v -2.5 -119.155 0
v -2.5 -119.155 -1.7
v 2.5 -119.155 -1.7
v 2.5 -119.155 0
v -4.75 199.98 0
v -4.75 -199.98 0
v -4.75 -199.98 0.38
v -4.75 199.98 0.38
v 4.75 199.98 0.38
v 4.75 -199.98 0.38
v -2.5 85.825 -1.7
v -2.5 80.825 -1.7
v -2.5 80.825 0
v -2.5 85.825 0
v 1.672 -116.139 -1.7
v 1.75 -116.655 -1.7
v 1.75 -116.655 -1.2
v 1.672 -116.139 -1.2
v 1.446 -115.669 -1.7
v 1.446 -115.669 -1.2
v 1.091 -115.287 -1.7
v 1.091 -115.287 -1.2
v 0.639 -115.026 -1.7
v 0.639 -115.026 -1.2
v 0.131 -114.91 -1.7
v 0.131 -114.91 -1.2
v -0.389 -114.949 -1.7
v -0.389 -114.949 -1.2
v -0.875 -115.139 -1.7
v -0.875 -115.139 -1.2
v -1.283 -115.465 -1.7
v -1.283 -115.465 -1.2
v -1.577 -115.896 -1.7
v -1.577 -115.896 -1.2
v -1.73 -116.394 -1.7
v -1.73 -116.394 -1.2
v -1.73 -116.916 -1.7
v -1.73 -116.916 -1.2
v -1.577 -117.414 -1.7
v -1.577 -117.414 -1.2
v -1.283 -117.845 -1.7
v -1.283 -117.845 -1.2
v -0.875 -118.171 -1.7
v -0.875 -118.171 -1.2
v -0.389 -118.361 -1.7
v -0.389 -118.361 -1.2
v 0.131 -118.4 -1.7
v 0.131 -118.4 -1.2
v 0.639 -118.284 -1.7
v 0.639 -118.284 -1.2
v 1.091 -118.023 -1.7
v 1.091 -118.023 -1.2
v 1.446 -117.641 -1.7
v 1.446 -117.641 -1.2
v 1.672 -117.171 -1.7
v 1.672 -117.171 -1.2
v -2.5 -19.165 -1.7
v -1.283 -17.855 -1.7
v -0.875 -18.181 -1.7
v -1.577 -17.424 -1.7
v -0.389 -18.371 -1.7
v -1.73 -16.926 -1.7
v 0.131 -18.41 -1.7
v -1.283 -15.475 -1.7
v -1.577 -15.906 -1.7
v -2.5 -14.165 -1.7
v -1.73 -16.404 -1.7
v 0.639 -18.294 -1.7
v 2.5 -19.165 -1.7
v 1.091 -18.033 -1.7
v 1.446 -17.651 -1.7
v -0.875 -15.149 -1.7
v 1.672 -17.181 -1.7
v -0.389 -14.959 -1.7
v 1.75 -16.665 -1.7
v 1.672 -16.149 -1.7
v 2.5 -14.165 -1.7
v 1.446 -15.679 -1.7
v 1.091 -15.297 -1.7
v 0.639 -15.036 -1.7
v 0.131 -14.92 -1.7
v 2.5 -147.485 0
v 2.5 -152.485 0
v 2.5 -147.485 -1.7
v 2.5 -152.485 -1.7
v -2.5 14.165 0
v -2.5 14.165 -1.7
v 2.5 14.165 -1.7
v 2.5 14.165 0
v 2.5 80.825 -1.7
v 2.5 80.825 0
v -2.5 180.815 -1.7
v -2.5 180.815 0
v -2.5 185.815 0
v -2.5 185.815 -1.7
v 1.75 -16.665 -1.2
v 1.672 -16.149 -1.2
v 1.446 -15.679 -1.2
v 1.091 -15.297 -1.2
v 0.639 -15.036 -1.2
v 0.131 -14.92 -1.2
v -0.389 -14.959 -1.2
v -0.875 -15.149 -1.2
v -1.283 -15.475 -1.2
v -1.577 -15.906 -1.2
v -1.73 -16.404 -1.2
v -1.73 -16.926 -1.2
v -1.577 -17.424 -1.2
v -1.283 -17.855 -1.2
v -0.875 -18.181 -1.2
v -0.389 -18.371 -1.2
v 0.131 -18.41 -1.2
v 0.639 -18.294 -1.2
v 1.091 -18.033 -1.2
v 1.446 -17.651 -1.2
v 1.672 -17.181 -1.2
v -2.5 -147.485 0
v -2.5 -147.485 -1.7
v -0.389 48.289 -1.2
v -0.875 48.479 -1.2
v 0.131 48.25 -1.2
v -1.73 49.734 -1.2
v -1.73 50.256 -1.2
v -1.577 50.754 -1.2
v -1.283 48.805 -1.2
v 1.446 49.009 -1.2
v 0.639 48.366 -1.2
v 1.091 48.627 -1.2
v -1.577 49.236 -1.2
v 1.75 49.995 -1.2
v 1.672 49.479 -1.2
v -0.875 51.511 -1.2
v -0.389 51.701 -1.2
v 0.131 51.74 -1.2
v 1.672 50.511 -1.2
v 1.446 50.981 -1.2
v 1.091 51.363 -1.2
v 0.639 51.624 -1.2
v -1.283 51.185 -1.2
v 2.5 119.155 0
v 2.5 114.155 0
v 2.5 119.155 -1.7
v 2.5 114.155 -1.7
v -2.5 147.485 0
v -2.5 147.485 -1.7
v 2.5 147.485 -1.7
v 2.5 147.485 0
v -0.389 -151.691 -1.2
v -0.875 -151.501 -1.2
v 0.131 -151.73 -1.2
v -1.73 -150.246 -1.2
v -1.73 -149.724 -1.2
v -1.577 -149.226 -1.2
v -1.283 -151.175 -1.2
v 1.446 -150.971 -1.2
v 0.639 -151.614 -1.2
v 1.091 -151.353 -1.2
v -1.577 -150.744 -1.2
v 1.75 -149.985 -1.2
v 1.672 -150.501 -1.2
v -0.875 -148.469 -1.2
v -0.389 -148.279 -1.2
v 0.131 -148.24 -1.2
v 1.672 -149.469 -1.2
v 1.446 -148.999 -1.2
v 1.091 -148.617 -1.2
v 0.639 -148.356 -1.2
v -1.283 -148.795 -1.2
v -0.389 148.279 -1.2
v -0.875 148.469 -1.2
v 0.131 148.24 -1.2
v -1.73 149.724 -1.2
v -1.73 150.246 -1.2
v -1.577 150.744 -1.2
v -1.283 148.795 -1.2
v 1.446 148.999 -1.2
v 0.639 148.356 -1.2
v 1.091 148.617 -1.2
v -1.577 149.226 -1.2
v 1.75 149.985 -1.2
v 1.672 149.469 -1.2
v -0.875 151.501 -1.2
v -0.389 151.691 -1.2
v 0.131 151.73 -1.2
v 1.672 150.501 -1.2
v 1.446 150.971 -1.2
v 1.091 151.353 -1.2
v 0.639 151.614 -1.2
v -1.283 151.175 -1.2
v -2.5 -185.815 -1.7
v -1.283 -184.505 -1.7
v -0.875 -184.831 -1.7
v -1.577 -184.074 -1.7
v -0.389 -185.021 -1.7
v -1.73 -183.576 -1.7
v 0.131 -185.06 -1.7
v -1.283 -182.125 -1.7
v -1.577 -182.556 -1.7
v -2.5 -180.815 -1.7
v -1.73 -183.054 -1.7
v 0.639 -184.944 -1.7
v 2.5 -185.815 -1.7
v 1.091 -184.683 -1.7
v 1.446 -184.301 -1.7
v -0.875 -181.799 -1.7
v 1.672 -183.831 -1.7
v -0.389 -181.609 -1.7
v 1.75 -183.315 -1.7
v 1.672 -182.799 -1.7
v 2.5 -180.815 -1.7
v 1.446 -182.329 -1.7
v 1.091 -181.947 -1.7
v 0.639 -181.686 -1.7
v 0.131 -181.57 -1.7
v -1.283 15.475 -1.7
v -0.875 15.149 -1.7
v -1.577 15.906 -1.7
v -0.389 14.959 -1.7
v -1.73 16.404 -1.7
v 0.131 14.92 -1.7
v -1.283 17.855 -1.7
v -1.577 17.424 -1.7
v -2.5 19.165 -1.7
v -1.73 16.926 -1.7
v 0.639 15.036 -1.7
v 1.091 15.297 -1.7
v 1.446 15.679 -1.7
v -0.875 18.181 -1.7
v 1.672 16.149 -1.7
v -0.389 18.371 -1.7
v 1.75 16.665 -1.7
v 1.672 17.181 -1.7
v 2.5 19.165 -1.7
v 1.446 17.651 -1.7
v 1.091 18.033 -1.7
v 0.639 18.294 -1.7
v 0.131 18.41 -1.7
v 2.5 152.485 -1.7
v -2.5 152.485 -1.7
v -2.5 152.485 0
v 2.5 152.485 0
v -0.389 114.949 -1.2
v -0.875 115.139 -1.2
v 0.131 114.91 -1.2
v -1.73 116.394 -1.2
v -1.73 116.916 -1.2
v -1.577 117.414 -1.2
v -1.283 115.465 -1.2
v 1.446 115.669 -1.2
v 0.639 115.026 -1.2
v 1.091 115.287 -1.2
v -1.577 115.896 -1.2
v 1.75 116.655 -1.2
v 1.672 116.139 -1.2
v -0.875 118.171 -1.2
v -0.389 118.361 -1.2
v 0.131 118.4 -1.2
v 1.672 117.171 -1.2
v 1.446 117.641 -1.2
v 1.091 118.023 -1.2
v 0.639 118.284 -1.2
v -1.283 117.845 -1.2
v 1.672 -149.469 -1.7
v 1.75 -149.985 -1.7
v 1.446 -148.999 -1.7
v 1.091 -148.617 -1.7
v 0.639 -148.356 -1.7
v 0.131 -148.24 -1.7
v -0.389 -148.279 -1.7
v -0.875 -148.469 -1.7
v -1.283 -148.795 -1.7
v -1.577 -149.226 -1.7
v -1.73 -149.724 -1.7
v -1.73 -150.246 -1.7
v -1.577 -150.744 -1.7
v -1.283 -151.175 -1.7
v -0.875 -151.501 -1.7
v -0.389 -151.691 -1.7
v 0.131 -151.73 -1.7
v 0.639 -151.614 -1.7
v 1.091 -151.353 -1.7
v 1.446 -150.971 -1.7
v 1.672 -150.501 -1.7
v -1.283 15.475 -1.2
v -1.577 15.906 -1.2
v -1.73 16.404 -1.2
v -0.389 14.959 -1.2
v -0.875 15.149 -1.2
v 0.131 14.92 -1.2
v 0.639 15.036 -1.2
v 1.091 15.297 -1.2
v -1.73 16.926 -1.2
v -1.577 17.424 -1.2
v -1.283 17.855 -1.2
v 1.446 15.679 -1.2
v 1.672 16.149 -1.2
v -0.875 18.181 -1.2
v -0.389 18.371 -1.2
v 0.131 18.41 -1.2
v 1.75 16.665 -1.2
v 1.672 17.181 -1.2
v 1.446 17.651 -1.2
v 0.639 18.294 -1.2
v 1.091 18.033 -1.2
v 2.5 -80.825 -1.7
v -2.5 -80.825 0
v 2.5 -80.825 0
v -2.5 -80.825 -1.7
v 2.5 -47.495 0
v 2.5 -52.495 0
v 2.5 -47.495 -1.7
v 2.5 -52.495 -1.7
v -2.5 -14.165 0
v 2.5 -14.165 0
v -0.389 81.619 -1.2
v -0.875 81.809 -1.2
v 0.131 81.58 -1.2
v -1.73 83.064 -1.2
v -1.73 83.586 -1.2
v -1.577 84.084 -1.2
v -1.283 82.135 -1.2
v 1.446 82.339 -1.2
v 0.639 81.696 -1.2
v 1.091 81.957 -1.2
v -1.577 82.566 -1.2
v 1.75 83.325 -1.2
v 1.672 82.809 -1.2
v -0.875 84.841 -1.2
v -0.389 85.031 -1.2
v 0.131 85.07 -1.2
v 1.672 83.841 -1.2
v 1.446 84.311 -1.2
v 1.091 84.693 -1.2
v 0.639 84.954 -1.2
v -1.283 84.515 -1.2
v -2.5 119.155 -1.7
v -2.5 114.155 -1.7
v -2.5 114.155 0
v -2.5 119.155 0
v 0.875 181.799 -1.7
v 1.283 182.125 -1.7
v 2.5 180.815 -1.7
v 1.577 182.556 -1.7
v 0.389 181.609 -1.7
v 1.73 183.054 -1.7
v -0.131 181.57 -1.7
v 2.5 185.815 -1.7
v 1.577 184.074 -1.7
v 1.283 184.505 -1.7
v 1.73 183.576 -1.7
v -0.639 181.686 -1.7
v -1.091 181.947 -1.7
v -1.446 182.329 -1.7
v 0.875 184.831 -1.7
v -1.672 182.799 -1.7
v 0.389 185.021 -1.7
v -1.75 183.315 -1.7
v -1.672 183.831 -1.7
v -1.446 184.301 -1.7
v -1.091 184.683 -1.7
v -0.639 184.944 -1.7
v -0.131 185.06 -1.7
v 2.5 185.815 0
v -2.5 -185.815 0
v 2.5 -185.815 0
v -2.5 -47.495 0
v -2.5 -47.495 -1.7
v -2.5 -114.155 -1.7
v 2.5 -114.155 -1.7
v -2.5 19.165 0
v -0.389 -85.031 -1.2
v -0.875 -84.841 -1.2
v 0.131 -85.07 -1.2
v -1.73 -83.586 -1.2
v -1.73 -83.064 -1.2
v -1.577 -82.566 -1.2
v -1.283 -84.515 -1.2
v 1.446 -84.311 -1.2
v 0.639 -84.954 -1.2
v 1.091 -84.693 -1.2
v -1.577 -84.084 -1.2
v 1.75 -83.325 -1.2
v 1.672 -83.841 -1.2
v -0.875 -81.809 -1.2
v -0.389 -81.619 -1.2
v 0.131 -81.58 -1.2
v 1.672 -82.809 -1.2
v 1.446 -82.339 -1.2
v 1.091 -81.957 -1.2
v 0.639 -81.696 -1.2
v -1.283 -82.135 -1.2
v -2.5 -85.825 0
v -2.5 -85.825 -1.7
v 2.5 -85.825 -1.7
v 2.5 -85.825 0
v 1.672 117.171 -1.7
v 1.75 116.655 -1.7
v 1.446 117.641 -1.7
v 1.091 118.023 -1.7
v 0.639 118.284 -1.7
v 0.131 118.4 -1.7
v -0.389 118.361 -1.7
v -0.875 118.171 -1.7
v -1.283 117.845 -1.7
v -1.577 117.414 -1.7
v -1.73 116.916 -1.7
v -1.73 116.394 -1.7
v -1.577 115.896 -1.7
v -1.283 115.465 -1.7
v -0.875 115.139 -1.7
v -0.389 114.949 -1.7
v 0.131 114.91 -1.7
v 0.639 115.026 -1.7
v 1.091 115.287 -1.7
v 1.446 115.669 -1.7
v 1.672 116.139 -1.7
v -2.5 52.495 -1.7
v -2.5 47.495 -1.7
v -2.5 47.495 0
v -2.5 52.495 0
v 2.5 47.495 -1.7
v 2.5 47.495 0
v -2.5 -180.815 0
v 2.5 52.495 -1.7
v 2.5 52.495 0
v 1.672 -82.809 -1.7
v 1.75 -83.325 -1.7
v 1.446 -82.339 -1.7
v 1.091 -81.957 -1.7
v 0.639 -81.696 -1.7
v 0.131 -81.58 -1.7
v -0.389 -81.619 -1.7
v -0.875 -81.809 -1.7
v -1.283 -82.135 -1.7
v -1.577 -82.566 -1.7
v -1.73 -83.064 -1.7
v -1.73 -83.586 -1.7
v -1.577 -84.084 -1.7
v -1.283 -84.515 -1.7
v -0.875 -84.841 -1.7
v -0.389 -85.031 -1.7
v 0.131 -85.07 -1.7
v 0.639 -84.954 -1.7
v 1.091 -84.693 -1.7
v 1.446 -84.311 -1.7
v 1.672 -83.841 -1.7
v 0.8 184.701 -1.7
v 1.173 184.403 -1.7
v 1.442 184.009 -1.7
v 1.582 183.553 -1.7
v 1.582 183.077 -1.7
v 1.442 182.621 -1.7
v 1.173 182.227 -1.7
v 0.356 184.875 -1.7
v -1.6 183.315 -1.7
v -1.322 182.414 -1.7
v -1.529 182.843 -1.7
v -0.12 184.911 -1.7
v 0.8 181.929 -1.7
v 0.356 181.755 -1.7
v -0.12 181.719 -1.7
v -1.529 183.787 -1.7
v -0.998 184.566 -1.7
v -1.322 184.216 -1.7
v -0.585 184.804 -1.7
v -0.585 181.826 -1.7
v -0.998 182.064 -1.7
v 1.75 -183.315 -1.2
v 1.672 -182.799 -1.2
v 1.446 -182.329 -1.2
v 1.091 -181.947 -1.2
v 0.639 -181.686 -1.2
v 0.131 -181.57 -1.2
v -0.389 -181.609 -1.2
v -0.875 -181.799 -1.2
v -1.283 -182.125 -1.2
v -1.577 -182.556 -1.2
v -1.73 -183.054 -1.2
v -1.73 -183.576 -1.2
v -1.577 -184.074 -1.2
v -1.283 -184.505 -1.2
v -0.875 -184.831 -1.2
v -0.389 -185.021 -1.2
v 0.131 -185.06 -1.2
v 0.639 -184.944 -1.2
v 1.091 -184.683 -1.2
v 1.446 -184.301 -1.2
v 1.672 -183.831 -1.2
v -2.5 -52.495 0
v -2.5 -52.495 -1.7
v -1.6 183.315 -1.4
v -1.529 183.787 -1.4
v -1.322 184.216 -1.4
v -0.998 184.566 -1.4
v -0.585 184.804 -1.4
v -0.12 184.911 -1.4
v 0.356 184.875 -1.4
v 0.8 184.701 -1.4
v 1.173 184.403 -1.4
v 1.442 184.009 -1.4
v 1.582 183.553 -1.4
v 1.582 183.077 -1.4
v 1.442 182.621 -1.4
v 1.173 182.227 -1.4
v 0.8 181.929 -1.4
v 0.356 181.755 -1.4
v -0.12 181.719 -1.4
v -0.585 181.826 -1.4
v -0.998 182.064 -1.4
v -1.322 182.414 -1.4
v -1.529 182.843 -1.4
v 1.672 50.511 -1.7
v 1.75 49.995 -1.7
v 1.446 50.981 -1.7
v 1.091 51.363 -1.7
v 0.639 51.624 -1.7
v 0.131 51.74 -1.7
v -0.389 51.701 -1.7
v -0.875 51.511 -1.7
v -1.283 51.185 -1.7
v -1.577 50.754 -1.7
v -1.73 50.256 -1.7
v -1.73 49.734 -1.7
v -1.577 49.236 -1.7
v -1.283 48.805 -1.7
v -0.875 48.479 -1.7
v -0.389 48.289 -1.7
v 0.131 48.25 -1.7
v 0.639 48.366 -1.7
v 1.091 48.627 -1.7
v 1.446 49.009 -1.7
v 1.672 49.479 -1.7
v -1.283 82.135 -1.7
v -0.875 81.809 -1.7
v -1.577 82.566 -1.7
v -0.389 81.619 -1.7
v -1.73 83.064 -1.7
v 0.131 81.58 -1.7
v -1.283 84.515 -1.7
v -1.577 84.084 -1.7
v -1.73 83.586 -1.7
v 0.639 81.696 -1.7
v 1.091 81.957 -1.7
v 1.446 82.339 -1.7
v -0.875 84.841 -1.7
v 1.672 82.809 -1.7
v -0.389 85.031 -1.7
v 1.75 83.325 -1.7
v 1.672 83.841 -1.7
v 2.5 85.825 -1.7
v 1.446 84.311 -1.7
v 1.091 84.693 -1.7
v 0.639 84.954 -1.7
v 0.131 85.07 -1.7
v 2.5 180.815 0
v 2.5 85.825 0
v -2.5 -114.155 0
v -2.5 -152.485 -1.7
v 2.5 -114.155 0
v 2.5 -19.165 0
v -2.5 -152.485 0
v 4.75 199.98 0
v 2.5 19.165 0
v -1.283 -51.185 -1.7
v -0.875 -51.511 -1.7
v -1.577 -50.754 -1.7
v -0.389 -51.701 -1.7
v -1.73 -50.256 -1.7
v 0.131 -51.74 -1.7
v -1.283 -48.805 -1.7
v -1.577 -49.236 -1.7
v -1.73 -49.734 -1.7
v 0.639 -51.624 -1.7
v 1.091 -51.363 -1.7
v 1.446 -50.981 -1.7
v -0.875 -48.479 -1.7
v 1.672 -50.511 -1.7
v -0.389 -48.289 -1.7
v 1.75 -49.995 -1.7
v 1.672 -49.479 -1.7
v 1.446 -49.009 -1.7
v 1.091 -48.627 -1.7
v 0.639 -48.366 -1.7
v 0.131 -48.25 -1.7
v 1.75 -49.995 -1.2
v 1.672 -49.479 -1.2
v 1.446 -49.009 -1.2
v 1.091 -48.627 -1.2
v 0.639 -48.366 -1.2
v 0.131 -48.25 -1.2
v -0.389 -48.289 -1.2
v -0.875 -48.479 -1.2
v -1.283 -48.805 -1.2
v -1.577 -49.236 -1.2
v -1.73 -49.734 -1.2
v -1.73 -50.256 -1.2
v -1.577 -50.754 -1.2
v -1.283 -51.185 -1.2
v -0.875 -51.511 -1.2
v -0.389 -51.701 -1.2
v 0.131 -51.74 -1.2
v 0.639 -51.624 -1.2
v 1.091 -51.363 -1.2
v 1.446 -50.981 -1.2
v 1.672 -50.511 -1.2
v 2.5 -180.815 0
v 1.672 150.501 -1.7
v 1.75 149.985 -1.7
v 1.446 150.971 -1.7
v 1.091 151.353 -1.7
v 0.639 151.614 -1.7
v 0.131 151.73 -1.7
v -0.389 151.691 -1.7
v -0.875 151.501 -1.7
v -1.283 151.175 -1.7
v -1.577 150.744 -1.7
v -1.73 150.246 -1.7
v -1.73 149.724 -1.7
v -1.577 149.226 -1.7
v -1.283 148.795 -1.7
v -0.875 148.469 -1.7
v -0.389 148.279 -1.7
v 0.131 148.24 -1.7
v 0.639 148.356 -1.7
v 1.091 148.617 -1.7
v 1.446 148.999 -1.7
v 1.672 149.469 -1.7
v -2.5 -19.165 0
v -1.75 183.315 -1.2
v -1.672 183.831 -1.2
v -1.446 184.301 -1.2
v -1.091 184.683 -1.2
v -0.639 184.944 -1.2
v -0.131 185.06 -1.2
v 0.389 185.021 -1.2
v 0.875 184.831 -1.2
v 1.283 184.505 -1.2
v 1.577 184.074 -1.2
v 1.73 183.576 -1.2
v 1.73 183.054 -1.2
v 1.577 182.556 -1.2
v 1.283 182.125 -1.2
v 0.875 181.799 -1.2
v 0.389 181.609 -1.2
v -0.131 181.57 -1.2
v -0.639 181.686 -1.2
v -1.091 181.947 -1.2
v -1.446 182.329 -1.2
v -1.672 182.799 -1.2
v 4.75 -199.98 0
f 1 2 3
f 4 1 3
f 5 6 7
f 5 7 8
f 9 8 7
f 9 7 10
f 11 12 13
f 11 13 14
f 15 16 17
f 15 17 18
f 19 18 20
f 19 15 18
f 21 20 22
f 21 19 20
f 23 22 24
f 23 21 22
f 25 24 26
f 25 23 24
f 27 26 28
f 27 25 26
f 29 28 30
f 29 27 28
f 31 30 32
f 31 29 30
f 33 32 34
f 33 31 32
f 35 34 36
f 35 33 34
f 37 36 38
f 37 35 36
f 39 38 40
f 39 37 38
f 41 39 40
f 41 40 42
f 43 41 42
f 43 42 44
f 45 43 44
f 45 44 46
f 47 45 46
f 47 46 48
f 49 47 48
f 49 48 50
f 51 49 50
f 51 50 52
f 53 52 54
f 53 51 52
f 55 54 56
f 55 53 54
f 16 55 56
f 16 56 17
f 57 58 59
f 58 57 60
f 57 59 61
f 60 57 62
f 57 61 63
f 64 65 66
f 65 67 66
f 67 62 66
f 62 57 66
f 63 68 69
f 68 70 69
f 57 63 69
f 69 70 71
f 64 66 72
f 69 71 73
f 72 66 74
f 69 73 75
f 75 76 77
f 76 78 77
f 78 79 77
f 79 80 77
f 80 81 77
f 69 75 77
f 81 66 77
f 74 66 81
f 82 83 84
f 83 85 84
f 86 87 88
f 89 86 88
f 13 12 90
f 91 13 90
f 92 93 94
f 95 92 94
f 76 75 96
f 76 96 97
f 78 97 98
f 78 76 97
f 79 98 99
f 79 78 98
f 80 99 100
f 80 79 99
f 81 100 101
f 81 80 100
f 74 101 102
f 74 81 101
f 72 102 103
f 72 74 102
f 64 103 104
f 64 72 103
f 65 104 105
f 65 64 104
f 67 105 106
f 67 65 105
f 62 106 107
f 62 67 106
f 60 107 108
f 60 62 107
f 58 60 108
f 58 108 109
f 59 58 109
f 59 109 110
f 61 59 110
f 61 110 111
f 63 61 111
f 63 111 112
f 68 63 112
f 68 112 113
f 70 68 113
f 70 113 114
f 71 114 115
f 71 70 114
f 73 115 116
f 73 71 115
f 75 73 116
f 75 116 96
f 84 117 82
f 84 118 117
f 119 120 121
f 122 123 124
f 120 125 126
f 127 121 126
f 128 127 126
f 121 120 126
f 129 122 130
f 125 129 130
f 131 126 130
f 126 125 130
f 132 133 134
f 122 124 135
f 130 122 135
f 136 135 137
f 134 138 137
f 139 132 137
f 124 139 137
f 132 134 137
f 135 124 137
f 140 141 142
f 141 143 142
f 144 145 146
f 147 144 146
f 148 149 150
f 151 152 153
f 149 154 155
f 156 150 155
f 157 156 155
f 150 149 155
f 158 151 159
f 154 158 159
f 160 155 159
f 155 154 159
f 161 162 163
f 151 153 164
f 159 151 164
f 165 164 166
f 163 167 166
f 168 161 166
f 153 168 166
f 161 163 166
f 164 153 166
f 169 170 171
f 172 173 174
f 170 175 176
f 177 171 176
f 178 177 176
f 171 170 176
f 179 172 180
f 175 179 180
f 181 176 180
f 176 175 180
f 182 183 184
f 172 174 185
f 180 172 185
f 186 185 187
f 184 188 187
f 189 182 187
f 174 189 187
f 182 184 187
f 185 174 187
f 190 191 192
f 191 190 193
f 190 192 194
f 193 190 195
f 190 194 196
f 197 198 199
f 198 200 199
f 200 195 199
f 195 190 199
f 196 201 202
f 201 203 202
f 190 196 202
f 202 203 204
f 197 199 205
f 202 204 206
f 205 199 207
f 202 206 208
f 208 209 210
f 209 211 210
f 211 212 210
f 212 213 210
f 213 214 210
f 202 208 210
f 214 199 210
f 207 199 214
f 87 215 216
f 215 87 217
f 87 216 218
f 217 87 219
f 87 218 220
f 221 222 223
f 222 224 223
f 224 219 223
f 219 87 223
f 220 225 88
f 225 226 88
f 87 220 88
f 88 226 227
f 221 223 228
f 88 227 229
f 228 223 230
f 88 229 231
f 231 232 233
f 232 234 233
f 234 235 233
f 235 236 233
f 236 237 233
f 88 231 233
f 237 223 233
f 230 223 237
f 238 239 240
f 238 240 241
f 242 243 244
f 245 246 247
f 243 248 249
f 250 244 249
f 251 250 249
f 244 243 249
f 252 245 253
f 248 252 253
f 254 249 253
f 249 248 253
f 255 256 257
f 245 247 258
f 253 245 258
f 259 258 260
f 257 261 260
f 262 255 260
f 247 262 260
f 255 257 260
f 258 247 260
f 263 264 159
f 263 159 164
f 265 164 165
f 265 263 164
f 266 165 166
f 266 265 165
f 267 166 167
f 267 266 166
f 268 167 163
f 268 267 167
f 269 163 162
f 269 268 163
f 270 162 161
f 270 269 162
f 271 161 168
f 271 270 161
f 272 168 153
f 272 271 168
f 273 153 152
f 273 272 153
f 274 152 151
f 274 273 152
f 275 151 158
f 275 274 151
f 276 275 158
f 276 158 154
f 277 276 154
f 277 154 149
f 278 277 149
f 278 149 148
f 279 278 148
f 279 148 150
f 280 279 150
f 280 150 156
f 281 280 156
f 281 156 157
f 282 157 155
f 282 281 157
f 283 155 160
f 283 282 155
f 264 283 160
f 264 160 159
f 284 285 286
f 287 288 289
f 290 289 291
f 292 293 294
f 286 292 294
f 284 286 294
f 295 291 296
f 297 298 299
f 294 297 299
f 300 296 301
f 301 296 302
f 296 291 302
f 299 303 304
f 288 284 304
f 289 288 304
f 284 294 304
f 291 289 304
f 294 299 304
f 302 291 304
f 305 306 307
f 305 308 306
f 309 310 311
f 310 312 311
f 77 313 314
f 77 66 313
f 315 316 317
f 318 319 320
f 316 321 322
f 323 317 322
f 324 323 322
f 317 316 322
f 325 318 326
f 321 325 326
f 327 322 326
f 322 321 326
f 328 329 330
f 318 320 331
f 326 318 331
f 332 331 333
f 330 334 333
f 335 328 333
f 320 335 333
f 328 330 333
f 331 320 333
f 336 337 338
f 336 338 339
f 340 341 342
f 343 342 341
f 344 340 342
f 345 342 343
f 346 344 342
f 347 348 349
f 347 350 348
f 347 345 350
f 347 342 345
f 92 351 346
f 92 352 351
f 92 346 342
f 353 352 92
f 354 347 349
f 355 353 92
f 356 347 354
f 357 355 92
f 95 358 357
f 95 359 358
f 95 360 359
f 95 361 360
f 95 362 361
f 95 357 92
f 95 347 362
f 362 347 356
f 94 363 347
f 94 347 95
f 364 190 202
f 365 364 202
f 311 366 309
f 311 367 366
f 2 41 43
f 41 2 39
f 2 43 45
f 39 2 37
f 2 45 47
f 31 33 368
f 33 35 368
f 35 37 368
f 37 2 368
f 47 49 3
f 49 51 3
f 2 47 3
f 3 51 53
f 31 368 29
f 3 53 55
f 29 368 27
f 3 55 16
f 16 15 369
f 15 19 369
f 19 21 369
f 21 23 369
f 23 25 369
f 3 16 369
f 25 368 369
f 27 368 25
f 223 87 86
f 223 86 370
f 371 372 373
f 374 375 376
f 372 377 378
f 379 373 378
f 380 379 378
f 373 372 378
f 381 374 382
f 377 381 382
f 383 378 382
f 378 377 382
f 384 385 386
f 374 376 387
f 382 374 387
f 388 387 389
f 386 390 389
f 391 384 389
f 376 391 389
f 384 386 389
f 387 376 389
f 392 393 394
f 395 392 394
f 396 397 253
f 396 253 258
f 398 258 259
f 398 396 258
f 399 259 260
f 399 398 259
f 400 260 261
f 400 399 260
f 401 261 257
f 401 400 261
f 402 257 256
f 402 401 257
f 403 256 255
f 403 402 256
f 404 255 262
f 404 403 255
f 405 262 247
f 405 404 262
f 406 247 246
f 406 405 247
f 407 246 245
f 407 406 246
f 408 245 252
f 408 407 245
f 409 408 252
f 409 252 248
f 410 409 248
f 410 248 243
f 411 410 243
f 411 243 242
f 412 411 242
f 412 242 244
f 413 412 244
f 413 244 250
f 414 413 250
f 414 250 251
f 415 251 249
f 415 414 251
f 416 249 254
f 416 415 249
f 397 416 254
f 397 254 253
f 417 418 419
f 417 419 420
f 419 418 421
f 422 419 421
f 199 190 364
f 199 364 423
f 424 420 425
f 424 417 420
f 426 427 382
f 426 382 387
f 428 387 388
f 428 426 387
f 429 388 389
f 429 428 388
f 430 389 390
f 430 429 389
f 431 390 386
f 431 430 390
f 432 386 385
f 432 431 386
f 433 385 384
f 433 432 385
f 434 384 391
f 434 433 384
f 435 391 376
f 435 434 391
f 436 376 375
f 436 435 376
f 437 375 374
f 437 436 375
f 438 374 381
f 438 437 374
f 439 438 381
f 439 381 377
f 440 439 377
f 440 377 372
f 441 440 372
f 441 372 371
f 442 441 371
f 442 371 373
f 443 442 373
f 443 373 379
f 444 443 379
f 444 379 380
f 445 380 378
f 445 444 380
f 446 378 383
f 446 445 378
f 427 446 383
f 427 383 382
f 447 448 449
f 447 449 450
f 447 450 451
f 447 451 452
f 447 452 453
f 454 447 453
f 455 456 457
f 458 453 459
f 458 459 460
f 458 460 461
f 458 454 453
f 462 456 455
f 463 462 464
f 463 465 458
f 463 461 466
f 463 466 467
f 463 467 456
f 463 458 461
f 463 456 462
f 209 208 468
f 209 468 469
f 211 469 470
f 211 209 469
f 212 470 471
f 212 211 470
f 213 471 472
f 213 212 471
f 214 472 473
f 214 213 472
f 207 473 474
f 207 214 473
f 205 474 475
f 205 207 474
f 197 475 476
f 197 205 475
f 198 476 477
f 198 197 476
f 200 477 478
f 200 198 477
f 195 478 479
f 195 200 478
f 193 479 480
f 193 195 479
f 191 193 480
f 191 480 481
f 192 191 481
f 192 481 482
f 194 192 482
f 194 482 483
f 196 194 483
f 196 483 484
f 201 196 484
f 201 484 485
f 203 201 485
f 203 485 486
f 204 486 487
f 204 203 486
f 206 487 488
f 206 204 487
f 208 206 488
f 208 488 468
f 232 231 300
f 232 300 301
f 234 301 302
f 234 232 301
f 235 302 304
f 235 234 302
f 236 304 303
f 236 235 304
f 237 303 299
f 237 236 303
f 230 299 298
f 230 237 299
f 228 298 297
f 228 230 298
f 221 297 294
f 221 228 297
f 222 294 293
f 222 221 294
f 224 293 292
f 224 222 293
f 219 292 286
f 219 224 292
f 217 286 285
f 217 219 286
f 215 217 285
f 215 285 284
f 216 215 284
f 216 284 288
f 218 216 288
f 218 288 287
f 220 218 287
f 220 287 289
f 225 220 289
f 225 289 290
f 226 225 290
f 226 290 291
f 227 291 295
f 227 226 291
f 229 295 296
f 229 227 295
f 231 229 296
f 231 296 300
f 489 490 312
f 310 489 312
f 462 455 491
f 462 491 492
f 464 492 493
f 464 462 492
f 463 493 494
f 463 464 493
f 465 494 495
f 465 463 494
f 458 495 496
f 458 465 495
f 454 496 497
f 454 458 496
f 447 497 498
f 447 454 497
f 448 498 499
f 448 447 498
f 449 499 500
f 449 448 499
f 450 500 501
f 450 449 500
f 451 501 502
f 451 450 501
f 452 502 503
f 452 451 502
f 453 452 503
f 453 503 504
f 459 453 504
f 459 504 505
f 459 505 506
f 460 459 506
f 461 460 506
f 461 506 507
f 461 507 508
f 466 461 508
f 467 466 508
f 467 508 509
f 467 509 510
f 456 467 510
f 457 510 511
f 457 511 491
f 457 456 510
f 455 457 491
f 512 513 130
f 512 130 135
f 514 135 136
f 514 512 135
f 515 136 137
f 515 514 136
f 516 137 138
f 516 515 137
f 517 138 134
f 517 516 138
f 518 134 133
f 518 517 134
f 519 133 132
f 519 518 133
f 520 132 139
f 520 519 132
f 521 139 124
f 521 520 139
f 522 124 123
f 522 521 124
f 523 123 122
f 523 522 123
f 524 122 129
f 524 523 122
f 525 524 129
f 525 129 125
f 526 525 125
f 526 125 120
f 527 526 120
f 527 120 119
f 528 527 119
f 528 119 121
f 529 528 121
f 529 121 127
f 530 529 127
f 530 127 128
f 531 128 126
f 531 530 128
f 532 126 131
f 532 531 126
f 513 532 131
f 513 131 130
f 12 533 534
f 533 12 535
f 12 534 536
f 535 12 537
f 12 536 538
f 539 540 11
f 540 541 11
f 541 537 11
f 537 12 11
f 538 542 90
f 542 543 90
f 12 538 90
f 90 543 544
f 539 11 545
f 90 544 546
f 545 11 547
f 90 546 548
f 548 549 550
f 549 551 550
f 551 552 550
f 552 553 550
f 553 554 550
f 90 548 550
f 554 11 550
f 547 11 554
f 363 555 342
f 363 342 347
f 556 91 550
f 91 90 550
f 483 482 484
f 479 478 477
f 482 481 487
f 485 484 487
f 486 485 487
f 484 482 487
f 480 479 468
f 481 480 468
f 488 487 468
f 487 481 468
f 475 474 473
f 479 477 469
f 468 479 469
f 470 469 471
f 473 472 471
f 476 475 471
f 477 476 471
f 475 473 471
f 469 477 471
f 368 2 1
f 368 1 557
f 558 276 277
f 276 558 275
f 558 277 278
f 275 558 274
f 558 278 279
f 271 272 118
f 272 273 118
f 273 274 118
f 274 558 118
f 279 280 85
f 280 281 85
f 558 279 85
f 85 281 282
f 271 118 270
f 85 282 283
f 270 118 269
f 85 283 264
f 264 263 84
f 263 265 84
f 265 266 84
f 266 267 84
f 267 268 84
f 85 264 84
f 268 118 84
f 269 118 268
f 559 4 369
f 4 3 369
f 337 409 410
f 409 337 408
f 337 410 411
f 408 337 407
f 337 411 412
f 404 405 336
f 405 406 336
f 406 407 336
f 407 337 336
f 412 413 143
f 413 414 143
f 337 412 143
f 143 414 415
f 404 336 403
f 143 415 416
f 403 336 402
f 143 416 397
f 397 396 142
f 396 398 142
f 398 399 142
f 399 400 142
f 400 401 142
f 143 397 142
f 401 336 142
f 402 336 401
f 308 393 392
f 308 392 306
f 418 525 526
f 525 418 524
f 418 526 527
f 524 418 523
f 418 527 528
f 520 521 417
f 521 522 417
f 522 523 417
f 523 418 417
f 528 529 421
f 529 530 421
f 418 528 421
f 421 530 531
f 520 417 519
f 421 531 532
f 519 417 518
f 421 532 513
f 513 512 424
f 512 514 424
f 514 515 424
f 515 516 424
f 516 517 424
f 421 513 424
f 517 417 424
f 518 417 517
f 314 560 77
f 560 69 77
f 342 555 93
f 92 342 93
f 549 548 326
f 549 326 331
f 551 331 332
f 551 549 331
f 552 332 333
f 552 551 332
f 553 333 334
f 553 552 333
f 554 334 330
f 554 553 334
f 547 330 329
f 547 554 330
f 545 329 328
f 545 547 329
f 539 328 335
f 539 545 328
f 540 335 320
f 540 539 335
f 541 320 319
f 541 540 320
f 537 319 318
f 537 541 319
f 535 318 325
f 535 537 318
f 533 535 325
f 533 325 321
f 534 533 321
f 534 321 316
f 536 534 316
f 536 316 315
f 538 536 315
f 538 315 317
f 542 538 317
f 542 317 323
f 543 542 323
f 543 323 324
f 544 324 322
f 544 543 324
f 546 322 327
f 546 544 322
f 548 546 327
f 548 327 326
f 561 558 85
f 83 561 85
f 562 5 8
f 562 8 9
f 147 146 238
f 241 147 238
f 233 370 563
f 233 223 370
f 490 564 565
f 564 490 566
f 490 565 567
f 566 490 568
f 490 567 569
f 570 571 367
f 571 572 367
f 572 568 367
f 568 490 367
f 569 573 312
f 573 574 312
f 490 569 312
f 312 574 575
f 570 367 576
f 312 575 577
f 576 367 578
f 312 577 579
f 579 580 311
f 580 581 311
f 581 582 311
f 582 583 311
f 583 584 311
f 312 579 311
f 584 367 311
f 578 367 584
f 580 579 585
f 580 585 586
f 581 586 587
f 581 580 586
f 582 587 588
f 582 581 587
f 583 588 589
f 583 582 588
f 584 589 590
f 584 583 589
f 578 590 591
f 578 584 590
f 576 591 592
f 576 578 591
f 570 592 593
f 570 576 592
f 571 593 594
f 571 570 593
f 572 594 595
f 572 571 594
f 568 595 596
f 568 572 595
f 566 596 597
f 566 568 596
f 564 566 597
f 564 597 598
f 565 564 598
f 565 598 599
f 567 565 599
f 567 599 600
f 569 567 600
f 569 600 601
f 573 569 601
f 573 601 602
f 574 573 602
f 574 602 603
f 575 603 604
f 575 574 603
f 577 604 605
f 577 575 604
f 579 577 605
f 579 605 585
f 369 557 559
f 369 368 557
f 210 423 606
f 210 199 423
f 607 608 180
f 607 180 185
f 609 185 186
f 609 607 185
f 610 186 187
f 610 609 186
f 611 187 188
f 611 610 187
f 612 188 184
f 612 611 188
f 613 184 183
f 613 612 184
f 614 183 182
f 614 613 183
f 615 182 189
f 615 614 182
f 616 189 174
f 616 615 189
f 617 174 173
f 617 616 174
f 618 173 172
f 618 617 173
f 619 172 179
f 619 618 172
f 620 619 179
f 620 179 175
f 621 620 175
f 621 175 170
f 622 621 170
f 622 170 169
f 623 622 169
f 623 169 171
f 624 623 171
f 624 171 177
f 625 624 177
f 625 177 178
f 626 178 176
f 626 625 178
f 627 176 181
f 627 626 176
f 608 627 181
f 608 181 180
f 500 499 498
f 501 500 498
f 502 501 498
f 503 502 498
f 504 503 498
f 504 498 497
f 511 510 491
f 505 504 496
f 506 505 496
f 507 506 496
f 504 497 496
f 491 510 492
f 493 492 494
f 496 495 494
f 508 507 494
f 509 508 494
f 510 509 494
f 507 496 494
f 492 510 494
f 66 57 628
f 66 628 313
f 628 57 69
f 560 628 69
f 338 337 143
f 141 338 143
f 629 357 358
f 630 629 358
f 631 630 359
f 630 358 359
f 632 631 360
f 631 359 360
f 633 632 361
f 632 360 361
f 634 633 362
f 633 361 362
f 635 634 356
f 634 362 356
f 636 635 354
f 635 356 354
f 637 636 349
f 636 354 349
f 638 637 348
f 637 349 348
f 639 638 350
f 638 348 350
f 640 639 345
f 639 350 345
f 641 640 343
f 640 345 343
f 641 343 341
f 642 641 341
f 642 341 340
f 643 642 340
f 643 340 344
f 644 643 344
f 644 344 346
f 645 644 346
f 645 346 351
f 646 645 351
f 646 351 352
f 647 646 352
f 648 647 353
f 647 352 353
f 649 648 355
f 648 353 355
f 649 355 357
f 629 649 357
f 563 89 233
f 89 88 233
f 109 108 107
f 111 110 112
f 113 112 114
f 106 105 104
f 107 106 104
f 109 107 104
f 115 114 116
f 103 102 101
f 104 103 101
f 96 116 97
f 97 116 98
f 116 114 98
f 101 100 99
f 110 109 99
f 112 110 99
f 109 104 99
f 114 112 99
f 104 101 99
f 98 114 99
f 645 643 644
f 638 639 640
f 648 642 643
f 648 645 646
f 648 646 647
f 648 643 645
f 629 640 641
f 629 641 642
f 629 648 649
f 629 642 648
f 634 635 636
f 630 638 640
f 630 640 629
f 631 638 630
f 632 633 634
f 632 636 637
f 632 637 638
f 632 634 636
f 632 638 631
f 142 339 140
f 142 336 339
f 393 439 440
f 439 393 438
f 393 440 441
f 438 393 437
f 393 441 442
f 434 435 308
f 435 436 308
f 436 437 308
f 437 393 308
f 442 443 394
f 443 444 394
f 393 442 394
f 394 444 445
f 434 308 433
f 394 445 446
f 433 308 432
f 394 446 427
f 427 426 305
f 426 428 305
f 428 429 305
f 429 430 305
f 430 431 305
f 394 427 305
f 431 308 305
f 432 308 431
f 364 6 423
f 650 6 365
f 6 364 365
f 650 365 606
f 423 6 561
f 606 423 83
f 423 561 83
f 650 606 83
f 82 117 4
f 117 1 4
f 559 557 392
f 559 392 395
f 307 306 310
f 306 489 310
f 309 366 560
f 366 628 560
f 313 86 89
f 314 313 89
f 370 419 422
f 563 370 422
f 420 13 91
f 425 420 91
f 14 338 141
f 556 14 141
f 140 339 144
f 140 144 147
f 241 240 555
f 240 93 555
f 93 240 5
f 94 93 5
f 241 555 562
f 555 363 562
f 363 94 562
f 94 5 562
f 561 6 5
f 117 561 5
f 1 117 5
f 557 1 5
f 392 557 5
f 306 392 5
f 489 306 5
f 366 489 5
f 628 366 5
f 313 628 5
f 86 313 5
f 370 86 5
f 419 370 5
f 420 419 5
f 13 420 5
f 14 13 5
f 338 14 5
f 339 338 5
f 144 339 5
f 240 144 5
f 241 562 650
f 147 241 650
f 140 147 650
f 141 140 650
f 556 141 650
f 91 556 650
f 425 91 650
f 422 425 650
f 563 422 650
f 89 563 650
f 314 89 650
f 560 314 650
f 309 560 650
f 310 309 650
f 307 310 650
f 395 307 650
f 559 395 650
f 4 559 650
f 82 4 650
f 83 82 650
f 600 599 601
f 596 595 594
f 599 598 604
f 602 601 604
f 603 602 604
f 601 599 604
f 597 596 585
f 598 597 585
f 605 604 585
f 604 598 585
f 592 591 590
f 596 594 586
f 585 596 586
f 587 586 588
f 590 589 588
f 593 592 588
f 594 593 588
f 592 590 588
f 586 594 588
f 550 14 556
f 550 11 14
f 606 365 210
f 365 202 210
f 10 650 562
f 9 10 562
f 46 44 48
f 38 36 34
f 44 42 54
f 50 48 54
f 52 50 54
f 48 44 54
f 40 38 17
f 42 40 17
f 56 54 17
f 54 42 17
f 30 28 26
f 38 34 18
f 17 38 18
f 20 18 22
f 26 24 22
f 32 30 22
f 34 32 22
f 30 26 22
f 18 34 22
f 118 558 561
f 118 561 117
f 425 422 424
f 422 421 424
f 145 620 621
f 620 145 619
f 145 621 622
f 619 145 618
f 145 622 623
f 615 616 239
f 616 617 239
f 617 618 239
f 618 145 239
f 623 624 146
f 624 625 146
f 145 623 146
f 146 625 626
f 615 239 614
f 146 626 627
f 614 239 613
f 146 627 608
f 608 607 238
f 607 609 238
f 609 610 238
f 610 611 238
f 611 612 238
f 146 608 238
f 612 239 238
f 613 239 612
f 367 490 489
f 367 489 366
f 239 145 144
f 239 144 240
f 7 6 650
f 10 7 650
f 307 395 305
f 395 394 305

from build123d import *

# Parameters (mm, degrees)
SKETCH_1_W                   = 9.5
SKETCH_1_H                   = 399.96
EXTRUDE_1_DEPTH              = 0.38
SKETCH_2_W                   = 5
SKETCH_2_H                   = 5
EXTRUDE_2_DEPTH              = 1.7
SKETCH_3_R                   = 1.75
CUT_EXTRUDE_1_DEPTH          = 0.5
SKETCH_4_R                   = 1.6
EXTRUDE_3_DEPTH              = 0.3
PATTERN_START                = -1.2
PATTERN_LINEAR_2_OUTLINE_W   = 5
PATTERN_LINEAR_2_OUTLINE_H   = 5
PATTERN_LINEAR_2_DEPTH       = 1.2
PATTERN_START_2              = -1.7
PATTERN_LINEAR_2_2_OUTLINE_W = 5
PATTERN_LINEAR_2_2_OUTLINE_H = 5
PATTERN_LINEAR_2_2_OUTLINE_R = 1.75
PATTERN_LINEAR_2_2_DEPTH     = 0.5


# Read off the part's stored shape, not the designer's step: 阵列(线性)2
with BuildPart() as part:
    # 草图1 → 凸台-拉伸1 (new body)
    with BuildSketch(Plane.XY):
        Rectangle(SKETCH_1_W, SKETCH_1_H)
    extrude(amount=EXTRUDE_1_DEPTH)

    # 草图2 → 凸台-拉伸2 (add)
    with BuildSketch(Plane(origin=(0, 0, 0), x_dir=(-1, 0, 0), z_dir=(0, 0, -1))):
        with Locations((0, 183.315)):
            Rectangle(SKETCH_2_W, SKETCH_2_H)
    extrude(amount=EXTRUDE_2_DEPTH)

    # 草图3 → 切除-拉伸1 (cut)
    with BuildSketch(Plane(origin=(0, 0, -1.7), x_dir=(-1, 0, 0), z_dir=(0, 0, -1))):
        with Locations((0, 183.315)):
            Circle(SKETCH_3_R)
    extrude(amount=-CUT_EXTRUDE_1_DEPTH, mode=Mode.SUBTRACT)

    # 阵列(线性)2 outline → 阵列(线性)2 (add)
    with BuildSketch(Plane.XY.offset(PATTERN_START)):
        with Locations((0, 149.985)):
            Rectangle(PATTERN_LINEAR_2_OUTLINE_W, PATTERN_LINEAR_2_OUTLINE_H)
        with Locations((0, 116.655)):
            Rectangle(PATTERN_LINEAR_2_OUTLINE_W, PATTERN_LINEAR_2_OUTLINE_H)
        with Locations((0, 83.325)):
            Rectangle(PATTERN_LINEAR_2_OUTLINE_W, PATTERN_LINEAR_2_OUTLINE_H)
        with Locations((0, 49.995)):
            Rectangle(PATTERN_LINEAR_2_OUTLINE_W, PATTERN_LINEAR_2_OUTLINE_H)
        with Locations((0, 16.665)):
            Rectangle(PATTERN_LINEAR_2_OUTLINE_W, PATTERN_LINEAR_2_OUTLINE_H)
        with Locations((0, -16.665)):
            Rectangle(PATTERN_LINEAR_2_OUTLINE_W, PATTERN_LINEAR_2_OUTLINE_H)
        with Locations((0, -49.995)):
            Rectangle(PATTERN_LINEAR_2_OUTLINE_W, PATTERN_LINEAR_2_OUTLINE_H)
        with Locations((0, -83.325)):
            Rectangle(PATTERN_LINEAR_2_OUTLINE_W, PATTERN_LINEAR_2_OUTLINE_H)
        with Locations((0, -116.655)):
            Rectangle(PATTERN_LINEAR_2_OUTLINE_W, PATTERN_LINEAR_2_OUTLINE_H)
        with Locations((0, -149.985)):
            Rectangle(PATTERN_LINEAR_2_OUTLINE_W, PATTERN_LINEAR_2_OUTLINE_H)
        with Locations((0, -183.315)):
            Rectangle(PATTERN_LINEAR_2_OUTLINE_W, PATTERN_LINEAR_2_OUTLINE_H)
    extrude(amount=PATTERN_LINEAR_2_DEPTH)

    # Pattern Linear 2 2 outline → Pattern Linear 2 2 (add)
    # profile 1 of 11: a face of its own
    with BuildSketch(Plane.XY.offset(PATTERN_START_2)):
        with Locations((0, 149.985)):
            Rectangle(PATTERN_LINEAR_2_2_OUTLINE_W, PATTERN_LINEAR_2_2_OUTLINE_H)
        with Locations((0, 149.985)):
            Circle(PATTERN_LINEAR_2_2_OUTLINE_R, mode=Mode.SUBTRACT)
    # profile 2 of 11: a face of its own
    with BuildSketch(Plane.XY.offset(PATTERN_START_2)):
        with Locations((0, 116.655)):
            Rectangle(PATTERN_LINEAR_2_2_OUTLINE_W, PATTERN_LINEAR_2_2_OUTLINE_H)
        with Locations((0, 116.655)):
            Circle(PATTERN_LINEAR_2_2_OUTLINE_R, mode=Mode.SUBTRACT)
    # profile 3 of 11: a face of its own
    with BuildSketch(Plane.XY.offset(PATTERN_START_2)):
        with Locations((0, 83.325)):
            Rectangle(PATTERN_LINEAR_2_2_OUTLINE_W, PATTERN_LINEAR_2_2_OUTLINE_H)
        with Locations((0, 83.325)):
            Circle(PATTERN_LINEAR_2_2_OUTLINE_R, mode=Mode.SUBTRACT)
    # profile 4 of 11: a face of its own
    with BuildSketch(Plane.XY.offset(PATTERN_START_2)):
        with Locations((0, 49.995)):
            Rectangle(PATTERN_LINEAR_2_2_OUTLINE_W, PATTERN_LINEAR_2_2_OUTLINE_H)
        with Locations((0, 49.995)):
            Circle(PATTERN_LINEAR_2_2_OUTLINE_R, mode=Mode.SUBTRACT)
    # profile 5 of 11: a face of its own
    with BuildSketch(Plane.XY.offset(PATTERN_START_2)):
        with Locations((0, 16.665)):
            Rectangle(PATTERN_LINEAR_2_2_OUTLINE_W, PATTERN_LINEAR_2_2_OUTLINE_H)
        with Locations((0, 16.665)):
            Circle(PATTERN_LINEAR_2_2_OUTLINE_R, mode=Mode.SUBTRACT)
    # profile 6 of 11: a face of its own
    with BuildSketch(Plane.XY.offset(PATTERN_START_2)):
        with Locations((0, -16.665)):
            Rectangle(PATTERN_LINEAR_2_2_OUTLINE_W, PATTERN_LINEAR_2_2_OUTLINE_H)
        with Locations((0, -16.665)):
            Circle(PATTERN_LINEAR_2_2_OUTLINE_R, mode=Mode.SUBTRACT)
    # profile 7 of 11: a face of its own
    with BuildSketch(Plane.XY.offset(PATTERN_START_2)):
        with Locations((0, -49.995)):
            Rectangle(PATTERN_LINEAR_2_2_OUTLINE_W, PATTERN_LINEAR_2_2_OUTLINE_H)
        with Locations((0, -49.995)):
            Circle(PATTERN_LINEAR_2_2_OUTLINE_R, mode=Mode.SUBTRACT)
    # profile 8 of 11: a face of its own
    with BuildSketch(Plane.XY.offset(PATTERN_START_2)):
        with Locations((0, -83.325)):
            Rectangle(PATTERN_LINEAR_2_2_OUTLINE_W, PATTERN_LINEAR_2_2_OUTLINE_H)
        with Locations((0, -83.325)):
            Circle(PATTERN_LINEAR_2_2_OUTLINE_R, mode=Mode.SUBTRACT)
    # profile 9 of 11: a face of its own
    with BuildSketch(Plane.XY.offset(PATTERN_START_2)):
        with Locations((0, -116.655)):
            Rectangle(PATTERN_LINEAR_2_2_OUTLINE_W, PATTERN_LINEAR_2_2_OUTLINE_H)
        with Locations((0, -116.655)):
            Circle(PATTERN_LINEAR_2_2_OUTLINE_R, mode=Mode.SUBTRACT)
    # profile 10 of 11: a face of its own
    with BuildSketch(Plane.XY.offset(PATTERN_START_2)):
        with Locations((0, -149.985)):
            Rectangle(PATTERN_LINEAR_2_2_OUTLINE_W, PATTERN_LINEAR_2_2_OUTLINE_H)
        with Locations((0, -149.985)):
            Circle(PATTERN_LINEAR_2_2_OUTLINE_R, mode=Mode.SUBTRACT)
    # profile 11 of 11: a face of its own
    with BuildSketch(Plane.XY.offset(PATTERN_START_2)):
        with Locations((0, -183.315)):
            Rectangle(PATTERN_LINEAR_2_2_OUTLINE_W, PATTERN_LINEAR_2_2_OUTLINE_H)
        with Locations((0, -183.315)):
            Circle(PATTERN_LINEAR_2_2_OUTLINE_R, mode=Mode.SUBTRACT)
    extrude(amount=PATTERN_LINEAR_2_2_DEPTH)


with BuildPart() as body_2:
    # 草图4 → 凸台-拉伸3 (new body)
    with BuildSketch(Plane(origin=(0, 0, -1.7), x_dir=(-1, 0, 0), z_dir=(0, 0, -1))):
        with Locations((0, 183.315)):
            Circle(SKETCH_4_R)
    extrude(amount=-EXTRUDE_3_DEPTH)


solid = Compound([part.part, body_2.part])
